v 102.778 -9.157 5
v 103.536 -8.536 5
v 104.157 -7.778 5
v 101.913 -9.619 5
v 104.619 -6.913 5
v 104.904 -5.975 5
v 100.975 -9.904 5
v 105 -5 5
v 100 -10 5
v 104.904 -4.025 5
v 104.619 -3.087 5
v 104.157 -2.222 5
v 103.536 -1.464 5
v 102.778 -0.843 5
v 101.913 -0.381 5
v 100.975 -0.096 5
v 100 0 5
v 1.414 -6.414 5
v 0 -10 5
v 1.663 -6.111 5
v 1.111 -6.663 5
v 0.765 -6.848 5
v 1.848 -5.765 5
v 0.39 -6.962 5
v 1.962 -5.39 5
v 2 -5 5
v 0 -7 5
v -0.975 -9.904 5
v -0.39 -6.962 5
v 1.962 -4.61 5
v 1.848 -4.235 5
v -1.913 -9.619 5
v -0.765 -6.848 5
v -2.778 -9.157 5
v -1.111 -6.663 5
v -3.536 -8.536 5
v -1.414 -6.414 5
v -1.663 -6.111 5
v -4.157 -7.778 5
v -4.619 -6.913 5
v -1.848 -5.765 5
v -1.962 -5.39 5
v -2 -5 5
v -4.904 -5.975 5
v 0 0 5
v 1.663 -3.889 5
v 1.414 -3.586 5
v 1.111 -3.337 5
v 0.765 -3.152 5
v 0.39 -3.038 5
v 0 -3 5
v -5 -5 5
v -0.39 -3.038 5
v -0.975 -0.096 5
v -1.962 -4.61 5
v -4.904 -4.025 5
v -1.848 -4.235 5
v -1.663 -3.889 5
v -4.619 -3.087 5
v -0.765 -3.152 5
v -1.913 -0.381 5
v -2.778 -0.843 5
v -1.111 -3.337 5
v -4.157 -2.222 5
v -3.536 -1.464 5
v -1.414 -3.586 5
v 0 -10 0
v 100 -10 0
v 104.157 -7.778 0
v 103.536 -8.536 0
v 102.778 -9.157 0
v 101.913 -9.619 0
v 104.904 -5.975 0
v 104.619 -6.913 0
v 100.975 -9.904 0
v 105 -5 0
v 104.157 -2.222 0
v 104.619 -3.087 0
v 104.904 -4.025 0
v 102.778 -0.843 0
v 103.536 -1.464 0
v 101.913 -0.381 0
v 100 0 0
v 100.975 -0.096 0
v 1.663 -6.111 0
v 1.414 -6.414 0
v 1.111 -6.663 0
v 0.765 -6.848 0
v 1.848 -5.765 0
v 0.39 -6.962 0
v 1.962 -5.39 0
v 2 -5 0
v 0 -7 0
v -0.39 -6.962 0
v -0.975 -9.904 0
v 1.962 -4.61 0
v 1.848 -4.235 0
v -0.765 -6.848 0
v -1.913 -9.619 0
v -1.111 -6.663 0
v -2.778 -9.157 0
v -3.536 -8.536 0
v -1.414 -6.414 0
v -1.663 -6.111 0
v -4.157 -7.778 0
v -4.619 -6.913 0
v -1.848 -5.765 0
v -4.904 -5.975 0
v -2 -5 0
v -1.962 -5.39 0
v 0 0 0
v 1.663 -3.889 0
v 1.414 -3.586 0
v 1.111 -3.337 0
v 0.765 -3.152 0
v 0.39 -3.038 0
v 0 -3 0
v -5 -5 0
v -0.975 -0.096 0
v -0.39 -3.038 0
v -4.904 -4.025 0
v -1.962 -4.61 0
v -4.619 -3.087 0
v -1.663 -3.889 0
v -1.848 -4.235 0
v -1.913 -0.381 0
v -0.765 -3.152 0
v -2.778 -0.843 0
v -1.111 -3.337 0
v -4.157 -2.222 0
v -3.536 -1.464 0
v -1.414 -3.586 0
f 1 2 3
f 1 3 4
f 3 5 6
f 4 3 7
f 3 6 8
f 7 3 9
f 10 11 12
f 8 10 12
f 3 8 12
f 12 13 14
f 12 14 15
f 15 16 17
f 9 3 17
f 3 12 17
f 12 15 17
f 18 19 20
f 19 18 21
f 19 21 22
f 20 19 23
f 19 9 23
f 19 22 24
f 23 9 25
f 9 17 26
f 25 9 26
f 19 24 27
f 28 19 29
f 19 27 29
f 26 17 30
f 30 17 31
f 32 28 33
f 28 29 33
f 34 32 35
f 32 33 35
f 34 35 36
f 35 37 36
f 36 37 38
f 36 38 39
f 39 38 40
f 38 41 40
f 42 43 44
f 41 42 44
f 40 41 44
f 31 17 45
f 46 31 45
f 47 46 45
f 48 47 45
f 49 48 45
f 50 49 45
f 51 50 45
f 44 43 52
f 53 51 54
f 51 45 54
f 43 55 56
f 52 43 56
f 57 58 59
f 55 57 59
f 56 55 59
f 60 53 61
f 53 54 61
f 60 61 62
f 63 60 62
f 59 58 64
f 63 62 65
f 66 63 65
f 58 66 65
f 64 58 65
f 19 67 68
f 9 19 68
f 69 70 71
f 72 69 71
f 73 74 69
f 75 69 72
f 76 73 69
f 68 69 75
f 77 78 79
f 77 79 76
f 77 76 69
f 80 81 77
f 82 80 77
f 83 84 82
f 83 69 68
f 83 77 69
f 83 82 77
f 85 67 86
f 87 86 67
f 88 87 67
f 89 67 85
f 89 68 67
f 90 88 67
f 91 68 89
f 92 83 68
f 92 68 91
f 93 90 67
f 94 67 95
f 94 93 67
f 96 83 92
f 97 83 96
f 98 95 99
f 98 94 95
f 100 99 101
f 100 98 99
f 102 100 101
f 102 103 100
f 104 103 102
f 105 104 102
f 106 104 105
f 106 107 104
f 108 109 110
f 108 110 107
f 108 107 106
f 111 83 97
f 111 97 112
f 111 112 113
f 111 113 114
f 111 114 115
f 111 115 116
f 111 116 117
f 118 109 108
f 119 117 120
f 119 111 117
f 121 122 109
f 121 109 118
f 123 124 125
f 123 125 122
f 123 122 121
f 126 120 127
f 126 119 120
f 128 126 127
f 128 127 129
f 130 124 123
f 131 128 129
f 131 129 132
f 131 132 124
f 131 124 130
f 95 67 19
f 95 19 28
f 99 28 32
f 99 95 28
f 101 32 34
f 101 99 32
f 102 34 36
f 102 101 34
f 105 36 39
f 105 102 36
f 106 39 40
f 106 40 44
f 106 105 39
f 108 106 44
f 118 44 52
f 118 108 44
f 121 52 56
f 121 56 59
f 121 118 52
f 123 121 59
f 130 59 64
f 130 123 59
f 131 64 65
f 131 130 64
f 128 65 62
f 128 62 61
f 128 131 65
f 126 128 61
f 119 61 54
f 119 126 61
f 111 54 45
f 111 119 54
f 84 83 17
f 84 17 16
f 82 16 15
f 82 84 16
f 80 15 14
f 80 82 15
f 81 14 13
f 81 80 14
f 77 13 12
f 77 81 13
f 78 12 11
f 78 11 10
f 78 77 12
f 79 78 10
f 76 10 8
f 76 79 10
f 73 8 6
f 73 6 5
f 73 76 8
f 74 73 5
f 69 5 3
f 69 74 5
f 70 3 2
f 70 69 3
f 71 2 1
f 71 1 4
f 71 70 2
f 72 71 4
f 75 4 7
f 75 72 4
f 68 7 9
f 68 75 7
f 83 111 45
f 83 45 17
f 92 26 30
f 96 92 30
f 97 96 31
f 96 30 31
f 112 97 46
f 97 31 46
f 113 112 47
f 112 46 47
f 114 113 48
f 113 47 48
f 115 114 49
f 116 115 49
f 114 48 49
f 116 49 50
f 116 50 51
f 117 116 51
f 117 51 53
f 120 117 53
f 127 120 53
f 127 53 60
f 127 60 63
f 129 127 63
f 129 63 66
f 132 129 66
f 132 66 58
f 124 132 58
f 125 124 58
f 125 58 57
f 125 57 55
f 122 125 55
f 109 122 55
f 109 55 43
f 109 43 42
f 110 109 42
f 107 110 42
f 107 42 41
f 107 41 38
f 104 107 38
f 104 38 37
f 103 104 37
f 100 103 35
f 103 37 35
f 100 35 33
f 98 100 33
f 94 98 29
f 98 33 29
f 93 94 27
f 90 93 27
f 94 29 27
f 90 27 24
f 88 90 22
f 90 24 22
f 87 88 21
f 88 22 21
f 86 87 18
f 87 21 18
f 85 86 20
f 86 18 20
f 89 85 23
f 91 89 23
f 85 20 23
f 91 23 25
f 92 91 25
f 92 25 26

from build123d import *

# Parameters (mm, degrees)
SKETCH1_W           = 100
SKETCH1_H           = 10
BOSS_EXTRUDE1_DEPTH = 5
SKETCH2_R           = 2
CUT_EXTRUDE1_DEPTH  = 106.59356041


with BuildPart() as part:
    # Sketch1 → Boss-Extrude1 (new body)
    with BuildSketch(Plane.XY):
        with BuildLine():
            Line((0, 0), (0, -10))
            ThreePointArc((0, -10), (-5, -5), (0, 0))
        make_face()
        with Locations((50, -5)):
            Rectangle(SKETCH1_W, SKETCH1_H)
        with BuildLine():
            ThreePointArc((100, 0), (105, -5), (100, -10))
            Line((100, -10), (100, 0))
        make_face()
    extrude(amount=BOSS_EXTRUDE1_DEPTH)

    # Sketch2 → Cut-Extrude1 (cut, through all)
    with BuildSketch(Plane.XY.offset(5)):
        with Locations((0, -5)):
            Circle(SKETCH2_R)
    extrude(amount=-CUT_EXTRUDE1_DEPTH, mode=Mode.SUBTRACT)


solid = part.part
